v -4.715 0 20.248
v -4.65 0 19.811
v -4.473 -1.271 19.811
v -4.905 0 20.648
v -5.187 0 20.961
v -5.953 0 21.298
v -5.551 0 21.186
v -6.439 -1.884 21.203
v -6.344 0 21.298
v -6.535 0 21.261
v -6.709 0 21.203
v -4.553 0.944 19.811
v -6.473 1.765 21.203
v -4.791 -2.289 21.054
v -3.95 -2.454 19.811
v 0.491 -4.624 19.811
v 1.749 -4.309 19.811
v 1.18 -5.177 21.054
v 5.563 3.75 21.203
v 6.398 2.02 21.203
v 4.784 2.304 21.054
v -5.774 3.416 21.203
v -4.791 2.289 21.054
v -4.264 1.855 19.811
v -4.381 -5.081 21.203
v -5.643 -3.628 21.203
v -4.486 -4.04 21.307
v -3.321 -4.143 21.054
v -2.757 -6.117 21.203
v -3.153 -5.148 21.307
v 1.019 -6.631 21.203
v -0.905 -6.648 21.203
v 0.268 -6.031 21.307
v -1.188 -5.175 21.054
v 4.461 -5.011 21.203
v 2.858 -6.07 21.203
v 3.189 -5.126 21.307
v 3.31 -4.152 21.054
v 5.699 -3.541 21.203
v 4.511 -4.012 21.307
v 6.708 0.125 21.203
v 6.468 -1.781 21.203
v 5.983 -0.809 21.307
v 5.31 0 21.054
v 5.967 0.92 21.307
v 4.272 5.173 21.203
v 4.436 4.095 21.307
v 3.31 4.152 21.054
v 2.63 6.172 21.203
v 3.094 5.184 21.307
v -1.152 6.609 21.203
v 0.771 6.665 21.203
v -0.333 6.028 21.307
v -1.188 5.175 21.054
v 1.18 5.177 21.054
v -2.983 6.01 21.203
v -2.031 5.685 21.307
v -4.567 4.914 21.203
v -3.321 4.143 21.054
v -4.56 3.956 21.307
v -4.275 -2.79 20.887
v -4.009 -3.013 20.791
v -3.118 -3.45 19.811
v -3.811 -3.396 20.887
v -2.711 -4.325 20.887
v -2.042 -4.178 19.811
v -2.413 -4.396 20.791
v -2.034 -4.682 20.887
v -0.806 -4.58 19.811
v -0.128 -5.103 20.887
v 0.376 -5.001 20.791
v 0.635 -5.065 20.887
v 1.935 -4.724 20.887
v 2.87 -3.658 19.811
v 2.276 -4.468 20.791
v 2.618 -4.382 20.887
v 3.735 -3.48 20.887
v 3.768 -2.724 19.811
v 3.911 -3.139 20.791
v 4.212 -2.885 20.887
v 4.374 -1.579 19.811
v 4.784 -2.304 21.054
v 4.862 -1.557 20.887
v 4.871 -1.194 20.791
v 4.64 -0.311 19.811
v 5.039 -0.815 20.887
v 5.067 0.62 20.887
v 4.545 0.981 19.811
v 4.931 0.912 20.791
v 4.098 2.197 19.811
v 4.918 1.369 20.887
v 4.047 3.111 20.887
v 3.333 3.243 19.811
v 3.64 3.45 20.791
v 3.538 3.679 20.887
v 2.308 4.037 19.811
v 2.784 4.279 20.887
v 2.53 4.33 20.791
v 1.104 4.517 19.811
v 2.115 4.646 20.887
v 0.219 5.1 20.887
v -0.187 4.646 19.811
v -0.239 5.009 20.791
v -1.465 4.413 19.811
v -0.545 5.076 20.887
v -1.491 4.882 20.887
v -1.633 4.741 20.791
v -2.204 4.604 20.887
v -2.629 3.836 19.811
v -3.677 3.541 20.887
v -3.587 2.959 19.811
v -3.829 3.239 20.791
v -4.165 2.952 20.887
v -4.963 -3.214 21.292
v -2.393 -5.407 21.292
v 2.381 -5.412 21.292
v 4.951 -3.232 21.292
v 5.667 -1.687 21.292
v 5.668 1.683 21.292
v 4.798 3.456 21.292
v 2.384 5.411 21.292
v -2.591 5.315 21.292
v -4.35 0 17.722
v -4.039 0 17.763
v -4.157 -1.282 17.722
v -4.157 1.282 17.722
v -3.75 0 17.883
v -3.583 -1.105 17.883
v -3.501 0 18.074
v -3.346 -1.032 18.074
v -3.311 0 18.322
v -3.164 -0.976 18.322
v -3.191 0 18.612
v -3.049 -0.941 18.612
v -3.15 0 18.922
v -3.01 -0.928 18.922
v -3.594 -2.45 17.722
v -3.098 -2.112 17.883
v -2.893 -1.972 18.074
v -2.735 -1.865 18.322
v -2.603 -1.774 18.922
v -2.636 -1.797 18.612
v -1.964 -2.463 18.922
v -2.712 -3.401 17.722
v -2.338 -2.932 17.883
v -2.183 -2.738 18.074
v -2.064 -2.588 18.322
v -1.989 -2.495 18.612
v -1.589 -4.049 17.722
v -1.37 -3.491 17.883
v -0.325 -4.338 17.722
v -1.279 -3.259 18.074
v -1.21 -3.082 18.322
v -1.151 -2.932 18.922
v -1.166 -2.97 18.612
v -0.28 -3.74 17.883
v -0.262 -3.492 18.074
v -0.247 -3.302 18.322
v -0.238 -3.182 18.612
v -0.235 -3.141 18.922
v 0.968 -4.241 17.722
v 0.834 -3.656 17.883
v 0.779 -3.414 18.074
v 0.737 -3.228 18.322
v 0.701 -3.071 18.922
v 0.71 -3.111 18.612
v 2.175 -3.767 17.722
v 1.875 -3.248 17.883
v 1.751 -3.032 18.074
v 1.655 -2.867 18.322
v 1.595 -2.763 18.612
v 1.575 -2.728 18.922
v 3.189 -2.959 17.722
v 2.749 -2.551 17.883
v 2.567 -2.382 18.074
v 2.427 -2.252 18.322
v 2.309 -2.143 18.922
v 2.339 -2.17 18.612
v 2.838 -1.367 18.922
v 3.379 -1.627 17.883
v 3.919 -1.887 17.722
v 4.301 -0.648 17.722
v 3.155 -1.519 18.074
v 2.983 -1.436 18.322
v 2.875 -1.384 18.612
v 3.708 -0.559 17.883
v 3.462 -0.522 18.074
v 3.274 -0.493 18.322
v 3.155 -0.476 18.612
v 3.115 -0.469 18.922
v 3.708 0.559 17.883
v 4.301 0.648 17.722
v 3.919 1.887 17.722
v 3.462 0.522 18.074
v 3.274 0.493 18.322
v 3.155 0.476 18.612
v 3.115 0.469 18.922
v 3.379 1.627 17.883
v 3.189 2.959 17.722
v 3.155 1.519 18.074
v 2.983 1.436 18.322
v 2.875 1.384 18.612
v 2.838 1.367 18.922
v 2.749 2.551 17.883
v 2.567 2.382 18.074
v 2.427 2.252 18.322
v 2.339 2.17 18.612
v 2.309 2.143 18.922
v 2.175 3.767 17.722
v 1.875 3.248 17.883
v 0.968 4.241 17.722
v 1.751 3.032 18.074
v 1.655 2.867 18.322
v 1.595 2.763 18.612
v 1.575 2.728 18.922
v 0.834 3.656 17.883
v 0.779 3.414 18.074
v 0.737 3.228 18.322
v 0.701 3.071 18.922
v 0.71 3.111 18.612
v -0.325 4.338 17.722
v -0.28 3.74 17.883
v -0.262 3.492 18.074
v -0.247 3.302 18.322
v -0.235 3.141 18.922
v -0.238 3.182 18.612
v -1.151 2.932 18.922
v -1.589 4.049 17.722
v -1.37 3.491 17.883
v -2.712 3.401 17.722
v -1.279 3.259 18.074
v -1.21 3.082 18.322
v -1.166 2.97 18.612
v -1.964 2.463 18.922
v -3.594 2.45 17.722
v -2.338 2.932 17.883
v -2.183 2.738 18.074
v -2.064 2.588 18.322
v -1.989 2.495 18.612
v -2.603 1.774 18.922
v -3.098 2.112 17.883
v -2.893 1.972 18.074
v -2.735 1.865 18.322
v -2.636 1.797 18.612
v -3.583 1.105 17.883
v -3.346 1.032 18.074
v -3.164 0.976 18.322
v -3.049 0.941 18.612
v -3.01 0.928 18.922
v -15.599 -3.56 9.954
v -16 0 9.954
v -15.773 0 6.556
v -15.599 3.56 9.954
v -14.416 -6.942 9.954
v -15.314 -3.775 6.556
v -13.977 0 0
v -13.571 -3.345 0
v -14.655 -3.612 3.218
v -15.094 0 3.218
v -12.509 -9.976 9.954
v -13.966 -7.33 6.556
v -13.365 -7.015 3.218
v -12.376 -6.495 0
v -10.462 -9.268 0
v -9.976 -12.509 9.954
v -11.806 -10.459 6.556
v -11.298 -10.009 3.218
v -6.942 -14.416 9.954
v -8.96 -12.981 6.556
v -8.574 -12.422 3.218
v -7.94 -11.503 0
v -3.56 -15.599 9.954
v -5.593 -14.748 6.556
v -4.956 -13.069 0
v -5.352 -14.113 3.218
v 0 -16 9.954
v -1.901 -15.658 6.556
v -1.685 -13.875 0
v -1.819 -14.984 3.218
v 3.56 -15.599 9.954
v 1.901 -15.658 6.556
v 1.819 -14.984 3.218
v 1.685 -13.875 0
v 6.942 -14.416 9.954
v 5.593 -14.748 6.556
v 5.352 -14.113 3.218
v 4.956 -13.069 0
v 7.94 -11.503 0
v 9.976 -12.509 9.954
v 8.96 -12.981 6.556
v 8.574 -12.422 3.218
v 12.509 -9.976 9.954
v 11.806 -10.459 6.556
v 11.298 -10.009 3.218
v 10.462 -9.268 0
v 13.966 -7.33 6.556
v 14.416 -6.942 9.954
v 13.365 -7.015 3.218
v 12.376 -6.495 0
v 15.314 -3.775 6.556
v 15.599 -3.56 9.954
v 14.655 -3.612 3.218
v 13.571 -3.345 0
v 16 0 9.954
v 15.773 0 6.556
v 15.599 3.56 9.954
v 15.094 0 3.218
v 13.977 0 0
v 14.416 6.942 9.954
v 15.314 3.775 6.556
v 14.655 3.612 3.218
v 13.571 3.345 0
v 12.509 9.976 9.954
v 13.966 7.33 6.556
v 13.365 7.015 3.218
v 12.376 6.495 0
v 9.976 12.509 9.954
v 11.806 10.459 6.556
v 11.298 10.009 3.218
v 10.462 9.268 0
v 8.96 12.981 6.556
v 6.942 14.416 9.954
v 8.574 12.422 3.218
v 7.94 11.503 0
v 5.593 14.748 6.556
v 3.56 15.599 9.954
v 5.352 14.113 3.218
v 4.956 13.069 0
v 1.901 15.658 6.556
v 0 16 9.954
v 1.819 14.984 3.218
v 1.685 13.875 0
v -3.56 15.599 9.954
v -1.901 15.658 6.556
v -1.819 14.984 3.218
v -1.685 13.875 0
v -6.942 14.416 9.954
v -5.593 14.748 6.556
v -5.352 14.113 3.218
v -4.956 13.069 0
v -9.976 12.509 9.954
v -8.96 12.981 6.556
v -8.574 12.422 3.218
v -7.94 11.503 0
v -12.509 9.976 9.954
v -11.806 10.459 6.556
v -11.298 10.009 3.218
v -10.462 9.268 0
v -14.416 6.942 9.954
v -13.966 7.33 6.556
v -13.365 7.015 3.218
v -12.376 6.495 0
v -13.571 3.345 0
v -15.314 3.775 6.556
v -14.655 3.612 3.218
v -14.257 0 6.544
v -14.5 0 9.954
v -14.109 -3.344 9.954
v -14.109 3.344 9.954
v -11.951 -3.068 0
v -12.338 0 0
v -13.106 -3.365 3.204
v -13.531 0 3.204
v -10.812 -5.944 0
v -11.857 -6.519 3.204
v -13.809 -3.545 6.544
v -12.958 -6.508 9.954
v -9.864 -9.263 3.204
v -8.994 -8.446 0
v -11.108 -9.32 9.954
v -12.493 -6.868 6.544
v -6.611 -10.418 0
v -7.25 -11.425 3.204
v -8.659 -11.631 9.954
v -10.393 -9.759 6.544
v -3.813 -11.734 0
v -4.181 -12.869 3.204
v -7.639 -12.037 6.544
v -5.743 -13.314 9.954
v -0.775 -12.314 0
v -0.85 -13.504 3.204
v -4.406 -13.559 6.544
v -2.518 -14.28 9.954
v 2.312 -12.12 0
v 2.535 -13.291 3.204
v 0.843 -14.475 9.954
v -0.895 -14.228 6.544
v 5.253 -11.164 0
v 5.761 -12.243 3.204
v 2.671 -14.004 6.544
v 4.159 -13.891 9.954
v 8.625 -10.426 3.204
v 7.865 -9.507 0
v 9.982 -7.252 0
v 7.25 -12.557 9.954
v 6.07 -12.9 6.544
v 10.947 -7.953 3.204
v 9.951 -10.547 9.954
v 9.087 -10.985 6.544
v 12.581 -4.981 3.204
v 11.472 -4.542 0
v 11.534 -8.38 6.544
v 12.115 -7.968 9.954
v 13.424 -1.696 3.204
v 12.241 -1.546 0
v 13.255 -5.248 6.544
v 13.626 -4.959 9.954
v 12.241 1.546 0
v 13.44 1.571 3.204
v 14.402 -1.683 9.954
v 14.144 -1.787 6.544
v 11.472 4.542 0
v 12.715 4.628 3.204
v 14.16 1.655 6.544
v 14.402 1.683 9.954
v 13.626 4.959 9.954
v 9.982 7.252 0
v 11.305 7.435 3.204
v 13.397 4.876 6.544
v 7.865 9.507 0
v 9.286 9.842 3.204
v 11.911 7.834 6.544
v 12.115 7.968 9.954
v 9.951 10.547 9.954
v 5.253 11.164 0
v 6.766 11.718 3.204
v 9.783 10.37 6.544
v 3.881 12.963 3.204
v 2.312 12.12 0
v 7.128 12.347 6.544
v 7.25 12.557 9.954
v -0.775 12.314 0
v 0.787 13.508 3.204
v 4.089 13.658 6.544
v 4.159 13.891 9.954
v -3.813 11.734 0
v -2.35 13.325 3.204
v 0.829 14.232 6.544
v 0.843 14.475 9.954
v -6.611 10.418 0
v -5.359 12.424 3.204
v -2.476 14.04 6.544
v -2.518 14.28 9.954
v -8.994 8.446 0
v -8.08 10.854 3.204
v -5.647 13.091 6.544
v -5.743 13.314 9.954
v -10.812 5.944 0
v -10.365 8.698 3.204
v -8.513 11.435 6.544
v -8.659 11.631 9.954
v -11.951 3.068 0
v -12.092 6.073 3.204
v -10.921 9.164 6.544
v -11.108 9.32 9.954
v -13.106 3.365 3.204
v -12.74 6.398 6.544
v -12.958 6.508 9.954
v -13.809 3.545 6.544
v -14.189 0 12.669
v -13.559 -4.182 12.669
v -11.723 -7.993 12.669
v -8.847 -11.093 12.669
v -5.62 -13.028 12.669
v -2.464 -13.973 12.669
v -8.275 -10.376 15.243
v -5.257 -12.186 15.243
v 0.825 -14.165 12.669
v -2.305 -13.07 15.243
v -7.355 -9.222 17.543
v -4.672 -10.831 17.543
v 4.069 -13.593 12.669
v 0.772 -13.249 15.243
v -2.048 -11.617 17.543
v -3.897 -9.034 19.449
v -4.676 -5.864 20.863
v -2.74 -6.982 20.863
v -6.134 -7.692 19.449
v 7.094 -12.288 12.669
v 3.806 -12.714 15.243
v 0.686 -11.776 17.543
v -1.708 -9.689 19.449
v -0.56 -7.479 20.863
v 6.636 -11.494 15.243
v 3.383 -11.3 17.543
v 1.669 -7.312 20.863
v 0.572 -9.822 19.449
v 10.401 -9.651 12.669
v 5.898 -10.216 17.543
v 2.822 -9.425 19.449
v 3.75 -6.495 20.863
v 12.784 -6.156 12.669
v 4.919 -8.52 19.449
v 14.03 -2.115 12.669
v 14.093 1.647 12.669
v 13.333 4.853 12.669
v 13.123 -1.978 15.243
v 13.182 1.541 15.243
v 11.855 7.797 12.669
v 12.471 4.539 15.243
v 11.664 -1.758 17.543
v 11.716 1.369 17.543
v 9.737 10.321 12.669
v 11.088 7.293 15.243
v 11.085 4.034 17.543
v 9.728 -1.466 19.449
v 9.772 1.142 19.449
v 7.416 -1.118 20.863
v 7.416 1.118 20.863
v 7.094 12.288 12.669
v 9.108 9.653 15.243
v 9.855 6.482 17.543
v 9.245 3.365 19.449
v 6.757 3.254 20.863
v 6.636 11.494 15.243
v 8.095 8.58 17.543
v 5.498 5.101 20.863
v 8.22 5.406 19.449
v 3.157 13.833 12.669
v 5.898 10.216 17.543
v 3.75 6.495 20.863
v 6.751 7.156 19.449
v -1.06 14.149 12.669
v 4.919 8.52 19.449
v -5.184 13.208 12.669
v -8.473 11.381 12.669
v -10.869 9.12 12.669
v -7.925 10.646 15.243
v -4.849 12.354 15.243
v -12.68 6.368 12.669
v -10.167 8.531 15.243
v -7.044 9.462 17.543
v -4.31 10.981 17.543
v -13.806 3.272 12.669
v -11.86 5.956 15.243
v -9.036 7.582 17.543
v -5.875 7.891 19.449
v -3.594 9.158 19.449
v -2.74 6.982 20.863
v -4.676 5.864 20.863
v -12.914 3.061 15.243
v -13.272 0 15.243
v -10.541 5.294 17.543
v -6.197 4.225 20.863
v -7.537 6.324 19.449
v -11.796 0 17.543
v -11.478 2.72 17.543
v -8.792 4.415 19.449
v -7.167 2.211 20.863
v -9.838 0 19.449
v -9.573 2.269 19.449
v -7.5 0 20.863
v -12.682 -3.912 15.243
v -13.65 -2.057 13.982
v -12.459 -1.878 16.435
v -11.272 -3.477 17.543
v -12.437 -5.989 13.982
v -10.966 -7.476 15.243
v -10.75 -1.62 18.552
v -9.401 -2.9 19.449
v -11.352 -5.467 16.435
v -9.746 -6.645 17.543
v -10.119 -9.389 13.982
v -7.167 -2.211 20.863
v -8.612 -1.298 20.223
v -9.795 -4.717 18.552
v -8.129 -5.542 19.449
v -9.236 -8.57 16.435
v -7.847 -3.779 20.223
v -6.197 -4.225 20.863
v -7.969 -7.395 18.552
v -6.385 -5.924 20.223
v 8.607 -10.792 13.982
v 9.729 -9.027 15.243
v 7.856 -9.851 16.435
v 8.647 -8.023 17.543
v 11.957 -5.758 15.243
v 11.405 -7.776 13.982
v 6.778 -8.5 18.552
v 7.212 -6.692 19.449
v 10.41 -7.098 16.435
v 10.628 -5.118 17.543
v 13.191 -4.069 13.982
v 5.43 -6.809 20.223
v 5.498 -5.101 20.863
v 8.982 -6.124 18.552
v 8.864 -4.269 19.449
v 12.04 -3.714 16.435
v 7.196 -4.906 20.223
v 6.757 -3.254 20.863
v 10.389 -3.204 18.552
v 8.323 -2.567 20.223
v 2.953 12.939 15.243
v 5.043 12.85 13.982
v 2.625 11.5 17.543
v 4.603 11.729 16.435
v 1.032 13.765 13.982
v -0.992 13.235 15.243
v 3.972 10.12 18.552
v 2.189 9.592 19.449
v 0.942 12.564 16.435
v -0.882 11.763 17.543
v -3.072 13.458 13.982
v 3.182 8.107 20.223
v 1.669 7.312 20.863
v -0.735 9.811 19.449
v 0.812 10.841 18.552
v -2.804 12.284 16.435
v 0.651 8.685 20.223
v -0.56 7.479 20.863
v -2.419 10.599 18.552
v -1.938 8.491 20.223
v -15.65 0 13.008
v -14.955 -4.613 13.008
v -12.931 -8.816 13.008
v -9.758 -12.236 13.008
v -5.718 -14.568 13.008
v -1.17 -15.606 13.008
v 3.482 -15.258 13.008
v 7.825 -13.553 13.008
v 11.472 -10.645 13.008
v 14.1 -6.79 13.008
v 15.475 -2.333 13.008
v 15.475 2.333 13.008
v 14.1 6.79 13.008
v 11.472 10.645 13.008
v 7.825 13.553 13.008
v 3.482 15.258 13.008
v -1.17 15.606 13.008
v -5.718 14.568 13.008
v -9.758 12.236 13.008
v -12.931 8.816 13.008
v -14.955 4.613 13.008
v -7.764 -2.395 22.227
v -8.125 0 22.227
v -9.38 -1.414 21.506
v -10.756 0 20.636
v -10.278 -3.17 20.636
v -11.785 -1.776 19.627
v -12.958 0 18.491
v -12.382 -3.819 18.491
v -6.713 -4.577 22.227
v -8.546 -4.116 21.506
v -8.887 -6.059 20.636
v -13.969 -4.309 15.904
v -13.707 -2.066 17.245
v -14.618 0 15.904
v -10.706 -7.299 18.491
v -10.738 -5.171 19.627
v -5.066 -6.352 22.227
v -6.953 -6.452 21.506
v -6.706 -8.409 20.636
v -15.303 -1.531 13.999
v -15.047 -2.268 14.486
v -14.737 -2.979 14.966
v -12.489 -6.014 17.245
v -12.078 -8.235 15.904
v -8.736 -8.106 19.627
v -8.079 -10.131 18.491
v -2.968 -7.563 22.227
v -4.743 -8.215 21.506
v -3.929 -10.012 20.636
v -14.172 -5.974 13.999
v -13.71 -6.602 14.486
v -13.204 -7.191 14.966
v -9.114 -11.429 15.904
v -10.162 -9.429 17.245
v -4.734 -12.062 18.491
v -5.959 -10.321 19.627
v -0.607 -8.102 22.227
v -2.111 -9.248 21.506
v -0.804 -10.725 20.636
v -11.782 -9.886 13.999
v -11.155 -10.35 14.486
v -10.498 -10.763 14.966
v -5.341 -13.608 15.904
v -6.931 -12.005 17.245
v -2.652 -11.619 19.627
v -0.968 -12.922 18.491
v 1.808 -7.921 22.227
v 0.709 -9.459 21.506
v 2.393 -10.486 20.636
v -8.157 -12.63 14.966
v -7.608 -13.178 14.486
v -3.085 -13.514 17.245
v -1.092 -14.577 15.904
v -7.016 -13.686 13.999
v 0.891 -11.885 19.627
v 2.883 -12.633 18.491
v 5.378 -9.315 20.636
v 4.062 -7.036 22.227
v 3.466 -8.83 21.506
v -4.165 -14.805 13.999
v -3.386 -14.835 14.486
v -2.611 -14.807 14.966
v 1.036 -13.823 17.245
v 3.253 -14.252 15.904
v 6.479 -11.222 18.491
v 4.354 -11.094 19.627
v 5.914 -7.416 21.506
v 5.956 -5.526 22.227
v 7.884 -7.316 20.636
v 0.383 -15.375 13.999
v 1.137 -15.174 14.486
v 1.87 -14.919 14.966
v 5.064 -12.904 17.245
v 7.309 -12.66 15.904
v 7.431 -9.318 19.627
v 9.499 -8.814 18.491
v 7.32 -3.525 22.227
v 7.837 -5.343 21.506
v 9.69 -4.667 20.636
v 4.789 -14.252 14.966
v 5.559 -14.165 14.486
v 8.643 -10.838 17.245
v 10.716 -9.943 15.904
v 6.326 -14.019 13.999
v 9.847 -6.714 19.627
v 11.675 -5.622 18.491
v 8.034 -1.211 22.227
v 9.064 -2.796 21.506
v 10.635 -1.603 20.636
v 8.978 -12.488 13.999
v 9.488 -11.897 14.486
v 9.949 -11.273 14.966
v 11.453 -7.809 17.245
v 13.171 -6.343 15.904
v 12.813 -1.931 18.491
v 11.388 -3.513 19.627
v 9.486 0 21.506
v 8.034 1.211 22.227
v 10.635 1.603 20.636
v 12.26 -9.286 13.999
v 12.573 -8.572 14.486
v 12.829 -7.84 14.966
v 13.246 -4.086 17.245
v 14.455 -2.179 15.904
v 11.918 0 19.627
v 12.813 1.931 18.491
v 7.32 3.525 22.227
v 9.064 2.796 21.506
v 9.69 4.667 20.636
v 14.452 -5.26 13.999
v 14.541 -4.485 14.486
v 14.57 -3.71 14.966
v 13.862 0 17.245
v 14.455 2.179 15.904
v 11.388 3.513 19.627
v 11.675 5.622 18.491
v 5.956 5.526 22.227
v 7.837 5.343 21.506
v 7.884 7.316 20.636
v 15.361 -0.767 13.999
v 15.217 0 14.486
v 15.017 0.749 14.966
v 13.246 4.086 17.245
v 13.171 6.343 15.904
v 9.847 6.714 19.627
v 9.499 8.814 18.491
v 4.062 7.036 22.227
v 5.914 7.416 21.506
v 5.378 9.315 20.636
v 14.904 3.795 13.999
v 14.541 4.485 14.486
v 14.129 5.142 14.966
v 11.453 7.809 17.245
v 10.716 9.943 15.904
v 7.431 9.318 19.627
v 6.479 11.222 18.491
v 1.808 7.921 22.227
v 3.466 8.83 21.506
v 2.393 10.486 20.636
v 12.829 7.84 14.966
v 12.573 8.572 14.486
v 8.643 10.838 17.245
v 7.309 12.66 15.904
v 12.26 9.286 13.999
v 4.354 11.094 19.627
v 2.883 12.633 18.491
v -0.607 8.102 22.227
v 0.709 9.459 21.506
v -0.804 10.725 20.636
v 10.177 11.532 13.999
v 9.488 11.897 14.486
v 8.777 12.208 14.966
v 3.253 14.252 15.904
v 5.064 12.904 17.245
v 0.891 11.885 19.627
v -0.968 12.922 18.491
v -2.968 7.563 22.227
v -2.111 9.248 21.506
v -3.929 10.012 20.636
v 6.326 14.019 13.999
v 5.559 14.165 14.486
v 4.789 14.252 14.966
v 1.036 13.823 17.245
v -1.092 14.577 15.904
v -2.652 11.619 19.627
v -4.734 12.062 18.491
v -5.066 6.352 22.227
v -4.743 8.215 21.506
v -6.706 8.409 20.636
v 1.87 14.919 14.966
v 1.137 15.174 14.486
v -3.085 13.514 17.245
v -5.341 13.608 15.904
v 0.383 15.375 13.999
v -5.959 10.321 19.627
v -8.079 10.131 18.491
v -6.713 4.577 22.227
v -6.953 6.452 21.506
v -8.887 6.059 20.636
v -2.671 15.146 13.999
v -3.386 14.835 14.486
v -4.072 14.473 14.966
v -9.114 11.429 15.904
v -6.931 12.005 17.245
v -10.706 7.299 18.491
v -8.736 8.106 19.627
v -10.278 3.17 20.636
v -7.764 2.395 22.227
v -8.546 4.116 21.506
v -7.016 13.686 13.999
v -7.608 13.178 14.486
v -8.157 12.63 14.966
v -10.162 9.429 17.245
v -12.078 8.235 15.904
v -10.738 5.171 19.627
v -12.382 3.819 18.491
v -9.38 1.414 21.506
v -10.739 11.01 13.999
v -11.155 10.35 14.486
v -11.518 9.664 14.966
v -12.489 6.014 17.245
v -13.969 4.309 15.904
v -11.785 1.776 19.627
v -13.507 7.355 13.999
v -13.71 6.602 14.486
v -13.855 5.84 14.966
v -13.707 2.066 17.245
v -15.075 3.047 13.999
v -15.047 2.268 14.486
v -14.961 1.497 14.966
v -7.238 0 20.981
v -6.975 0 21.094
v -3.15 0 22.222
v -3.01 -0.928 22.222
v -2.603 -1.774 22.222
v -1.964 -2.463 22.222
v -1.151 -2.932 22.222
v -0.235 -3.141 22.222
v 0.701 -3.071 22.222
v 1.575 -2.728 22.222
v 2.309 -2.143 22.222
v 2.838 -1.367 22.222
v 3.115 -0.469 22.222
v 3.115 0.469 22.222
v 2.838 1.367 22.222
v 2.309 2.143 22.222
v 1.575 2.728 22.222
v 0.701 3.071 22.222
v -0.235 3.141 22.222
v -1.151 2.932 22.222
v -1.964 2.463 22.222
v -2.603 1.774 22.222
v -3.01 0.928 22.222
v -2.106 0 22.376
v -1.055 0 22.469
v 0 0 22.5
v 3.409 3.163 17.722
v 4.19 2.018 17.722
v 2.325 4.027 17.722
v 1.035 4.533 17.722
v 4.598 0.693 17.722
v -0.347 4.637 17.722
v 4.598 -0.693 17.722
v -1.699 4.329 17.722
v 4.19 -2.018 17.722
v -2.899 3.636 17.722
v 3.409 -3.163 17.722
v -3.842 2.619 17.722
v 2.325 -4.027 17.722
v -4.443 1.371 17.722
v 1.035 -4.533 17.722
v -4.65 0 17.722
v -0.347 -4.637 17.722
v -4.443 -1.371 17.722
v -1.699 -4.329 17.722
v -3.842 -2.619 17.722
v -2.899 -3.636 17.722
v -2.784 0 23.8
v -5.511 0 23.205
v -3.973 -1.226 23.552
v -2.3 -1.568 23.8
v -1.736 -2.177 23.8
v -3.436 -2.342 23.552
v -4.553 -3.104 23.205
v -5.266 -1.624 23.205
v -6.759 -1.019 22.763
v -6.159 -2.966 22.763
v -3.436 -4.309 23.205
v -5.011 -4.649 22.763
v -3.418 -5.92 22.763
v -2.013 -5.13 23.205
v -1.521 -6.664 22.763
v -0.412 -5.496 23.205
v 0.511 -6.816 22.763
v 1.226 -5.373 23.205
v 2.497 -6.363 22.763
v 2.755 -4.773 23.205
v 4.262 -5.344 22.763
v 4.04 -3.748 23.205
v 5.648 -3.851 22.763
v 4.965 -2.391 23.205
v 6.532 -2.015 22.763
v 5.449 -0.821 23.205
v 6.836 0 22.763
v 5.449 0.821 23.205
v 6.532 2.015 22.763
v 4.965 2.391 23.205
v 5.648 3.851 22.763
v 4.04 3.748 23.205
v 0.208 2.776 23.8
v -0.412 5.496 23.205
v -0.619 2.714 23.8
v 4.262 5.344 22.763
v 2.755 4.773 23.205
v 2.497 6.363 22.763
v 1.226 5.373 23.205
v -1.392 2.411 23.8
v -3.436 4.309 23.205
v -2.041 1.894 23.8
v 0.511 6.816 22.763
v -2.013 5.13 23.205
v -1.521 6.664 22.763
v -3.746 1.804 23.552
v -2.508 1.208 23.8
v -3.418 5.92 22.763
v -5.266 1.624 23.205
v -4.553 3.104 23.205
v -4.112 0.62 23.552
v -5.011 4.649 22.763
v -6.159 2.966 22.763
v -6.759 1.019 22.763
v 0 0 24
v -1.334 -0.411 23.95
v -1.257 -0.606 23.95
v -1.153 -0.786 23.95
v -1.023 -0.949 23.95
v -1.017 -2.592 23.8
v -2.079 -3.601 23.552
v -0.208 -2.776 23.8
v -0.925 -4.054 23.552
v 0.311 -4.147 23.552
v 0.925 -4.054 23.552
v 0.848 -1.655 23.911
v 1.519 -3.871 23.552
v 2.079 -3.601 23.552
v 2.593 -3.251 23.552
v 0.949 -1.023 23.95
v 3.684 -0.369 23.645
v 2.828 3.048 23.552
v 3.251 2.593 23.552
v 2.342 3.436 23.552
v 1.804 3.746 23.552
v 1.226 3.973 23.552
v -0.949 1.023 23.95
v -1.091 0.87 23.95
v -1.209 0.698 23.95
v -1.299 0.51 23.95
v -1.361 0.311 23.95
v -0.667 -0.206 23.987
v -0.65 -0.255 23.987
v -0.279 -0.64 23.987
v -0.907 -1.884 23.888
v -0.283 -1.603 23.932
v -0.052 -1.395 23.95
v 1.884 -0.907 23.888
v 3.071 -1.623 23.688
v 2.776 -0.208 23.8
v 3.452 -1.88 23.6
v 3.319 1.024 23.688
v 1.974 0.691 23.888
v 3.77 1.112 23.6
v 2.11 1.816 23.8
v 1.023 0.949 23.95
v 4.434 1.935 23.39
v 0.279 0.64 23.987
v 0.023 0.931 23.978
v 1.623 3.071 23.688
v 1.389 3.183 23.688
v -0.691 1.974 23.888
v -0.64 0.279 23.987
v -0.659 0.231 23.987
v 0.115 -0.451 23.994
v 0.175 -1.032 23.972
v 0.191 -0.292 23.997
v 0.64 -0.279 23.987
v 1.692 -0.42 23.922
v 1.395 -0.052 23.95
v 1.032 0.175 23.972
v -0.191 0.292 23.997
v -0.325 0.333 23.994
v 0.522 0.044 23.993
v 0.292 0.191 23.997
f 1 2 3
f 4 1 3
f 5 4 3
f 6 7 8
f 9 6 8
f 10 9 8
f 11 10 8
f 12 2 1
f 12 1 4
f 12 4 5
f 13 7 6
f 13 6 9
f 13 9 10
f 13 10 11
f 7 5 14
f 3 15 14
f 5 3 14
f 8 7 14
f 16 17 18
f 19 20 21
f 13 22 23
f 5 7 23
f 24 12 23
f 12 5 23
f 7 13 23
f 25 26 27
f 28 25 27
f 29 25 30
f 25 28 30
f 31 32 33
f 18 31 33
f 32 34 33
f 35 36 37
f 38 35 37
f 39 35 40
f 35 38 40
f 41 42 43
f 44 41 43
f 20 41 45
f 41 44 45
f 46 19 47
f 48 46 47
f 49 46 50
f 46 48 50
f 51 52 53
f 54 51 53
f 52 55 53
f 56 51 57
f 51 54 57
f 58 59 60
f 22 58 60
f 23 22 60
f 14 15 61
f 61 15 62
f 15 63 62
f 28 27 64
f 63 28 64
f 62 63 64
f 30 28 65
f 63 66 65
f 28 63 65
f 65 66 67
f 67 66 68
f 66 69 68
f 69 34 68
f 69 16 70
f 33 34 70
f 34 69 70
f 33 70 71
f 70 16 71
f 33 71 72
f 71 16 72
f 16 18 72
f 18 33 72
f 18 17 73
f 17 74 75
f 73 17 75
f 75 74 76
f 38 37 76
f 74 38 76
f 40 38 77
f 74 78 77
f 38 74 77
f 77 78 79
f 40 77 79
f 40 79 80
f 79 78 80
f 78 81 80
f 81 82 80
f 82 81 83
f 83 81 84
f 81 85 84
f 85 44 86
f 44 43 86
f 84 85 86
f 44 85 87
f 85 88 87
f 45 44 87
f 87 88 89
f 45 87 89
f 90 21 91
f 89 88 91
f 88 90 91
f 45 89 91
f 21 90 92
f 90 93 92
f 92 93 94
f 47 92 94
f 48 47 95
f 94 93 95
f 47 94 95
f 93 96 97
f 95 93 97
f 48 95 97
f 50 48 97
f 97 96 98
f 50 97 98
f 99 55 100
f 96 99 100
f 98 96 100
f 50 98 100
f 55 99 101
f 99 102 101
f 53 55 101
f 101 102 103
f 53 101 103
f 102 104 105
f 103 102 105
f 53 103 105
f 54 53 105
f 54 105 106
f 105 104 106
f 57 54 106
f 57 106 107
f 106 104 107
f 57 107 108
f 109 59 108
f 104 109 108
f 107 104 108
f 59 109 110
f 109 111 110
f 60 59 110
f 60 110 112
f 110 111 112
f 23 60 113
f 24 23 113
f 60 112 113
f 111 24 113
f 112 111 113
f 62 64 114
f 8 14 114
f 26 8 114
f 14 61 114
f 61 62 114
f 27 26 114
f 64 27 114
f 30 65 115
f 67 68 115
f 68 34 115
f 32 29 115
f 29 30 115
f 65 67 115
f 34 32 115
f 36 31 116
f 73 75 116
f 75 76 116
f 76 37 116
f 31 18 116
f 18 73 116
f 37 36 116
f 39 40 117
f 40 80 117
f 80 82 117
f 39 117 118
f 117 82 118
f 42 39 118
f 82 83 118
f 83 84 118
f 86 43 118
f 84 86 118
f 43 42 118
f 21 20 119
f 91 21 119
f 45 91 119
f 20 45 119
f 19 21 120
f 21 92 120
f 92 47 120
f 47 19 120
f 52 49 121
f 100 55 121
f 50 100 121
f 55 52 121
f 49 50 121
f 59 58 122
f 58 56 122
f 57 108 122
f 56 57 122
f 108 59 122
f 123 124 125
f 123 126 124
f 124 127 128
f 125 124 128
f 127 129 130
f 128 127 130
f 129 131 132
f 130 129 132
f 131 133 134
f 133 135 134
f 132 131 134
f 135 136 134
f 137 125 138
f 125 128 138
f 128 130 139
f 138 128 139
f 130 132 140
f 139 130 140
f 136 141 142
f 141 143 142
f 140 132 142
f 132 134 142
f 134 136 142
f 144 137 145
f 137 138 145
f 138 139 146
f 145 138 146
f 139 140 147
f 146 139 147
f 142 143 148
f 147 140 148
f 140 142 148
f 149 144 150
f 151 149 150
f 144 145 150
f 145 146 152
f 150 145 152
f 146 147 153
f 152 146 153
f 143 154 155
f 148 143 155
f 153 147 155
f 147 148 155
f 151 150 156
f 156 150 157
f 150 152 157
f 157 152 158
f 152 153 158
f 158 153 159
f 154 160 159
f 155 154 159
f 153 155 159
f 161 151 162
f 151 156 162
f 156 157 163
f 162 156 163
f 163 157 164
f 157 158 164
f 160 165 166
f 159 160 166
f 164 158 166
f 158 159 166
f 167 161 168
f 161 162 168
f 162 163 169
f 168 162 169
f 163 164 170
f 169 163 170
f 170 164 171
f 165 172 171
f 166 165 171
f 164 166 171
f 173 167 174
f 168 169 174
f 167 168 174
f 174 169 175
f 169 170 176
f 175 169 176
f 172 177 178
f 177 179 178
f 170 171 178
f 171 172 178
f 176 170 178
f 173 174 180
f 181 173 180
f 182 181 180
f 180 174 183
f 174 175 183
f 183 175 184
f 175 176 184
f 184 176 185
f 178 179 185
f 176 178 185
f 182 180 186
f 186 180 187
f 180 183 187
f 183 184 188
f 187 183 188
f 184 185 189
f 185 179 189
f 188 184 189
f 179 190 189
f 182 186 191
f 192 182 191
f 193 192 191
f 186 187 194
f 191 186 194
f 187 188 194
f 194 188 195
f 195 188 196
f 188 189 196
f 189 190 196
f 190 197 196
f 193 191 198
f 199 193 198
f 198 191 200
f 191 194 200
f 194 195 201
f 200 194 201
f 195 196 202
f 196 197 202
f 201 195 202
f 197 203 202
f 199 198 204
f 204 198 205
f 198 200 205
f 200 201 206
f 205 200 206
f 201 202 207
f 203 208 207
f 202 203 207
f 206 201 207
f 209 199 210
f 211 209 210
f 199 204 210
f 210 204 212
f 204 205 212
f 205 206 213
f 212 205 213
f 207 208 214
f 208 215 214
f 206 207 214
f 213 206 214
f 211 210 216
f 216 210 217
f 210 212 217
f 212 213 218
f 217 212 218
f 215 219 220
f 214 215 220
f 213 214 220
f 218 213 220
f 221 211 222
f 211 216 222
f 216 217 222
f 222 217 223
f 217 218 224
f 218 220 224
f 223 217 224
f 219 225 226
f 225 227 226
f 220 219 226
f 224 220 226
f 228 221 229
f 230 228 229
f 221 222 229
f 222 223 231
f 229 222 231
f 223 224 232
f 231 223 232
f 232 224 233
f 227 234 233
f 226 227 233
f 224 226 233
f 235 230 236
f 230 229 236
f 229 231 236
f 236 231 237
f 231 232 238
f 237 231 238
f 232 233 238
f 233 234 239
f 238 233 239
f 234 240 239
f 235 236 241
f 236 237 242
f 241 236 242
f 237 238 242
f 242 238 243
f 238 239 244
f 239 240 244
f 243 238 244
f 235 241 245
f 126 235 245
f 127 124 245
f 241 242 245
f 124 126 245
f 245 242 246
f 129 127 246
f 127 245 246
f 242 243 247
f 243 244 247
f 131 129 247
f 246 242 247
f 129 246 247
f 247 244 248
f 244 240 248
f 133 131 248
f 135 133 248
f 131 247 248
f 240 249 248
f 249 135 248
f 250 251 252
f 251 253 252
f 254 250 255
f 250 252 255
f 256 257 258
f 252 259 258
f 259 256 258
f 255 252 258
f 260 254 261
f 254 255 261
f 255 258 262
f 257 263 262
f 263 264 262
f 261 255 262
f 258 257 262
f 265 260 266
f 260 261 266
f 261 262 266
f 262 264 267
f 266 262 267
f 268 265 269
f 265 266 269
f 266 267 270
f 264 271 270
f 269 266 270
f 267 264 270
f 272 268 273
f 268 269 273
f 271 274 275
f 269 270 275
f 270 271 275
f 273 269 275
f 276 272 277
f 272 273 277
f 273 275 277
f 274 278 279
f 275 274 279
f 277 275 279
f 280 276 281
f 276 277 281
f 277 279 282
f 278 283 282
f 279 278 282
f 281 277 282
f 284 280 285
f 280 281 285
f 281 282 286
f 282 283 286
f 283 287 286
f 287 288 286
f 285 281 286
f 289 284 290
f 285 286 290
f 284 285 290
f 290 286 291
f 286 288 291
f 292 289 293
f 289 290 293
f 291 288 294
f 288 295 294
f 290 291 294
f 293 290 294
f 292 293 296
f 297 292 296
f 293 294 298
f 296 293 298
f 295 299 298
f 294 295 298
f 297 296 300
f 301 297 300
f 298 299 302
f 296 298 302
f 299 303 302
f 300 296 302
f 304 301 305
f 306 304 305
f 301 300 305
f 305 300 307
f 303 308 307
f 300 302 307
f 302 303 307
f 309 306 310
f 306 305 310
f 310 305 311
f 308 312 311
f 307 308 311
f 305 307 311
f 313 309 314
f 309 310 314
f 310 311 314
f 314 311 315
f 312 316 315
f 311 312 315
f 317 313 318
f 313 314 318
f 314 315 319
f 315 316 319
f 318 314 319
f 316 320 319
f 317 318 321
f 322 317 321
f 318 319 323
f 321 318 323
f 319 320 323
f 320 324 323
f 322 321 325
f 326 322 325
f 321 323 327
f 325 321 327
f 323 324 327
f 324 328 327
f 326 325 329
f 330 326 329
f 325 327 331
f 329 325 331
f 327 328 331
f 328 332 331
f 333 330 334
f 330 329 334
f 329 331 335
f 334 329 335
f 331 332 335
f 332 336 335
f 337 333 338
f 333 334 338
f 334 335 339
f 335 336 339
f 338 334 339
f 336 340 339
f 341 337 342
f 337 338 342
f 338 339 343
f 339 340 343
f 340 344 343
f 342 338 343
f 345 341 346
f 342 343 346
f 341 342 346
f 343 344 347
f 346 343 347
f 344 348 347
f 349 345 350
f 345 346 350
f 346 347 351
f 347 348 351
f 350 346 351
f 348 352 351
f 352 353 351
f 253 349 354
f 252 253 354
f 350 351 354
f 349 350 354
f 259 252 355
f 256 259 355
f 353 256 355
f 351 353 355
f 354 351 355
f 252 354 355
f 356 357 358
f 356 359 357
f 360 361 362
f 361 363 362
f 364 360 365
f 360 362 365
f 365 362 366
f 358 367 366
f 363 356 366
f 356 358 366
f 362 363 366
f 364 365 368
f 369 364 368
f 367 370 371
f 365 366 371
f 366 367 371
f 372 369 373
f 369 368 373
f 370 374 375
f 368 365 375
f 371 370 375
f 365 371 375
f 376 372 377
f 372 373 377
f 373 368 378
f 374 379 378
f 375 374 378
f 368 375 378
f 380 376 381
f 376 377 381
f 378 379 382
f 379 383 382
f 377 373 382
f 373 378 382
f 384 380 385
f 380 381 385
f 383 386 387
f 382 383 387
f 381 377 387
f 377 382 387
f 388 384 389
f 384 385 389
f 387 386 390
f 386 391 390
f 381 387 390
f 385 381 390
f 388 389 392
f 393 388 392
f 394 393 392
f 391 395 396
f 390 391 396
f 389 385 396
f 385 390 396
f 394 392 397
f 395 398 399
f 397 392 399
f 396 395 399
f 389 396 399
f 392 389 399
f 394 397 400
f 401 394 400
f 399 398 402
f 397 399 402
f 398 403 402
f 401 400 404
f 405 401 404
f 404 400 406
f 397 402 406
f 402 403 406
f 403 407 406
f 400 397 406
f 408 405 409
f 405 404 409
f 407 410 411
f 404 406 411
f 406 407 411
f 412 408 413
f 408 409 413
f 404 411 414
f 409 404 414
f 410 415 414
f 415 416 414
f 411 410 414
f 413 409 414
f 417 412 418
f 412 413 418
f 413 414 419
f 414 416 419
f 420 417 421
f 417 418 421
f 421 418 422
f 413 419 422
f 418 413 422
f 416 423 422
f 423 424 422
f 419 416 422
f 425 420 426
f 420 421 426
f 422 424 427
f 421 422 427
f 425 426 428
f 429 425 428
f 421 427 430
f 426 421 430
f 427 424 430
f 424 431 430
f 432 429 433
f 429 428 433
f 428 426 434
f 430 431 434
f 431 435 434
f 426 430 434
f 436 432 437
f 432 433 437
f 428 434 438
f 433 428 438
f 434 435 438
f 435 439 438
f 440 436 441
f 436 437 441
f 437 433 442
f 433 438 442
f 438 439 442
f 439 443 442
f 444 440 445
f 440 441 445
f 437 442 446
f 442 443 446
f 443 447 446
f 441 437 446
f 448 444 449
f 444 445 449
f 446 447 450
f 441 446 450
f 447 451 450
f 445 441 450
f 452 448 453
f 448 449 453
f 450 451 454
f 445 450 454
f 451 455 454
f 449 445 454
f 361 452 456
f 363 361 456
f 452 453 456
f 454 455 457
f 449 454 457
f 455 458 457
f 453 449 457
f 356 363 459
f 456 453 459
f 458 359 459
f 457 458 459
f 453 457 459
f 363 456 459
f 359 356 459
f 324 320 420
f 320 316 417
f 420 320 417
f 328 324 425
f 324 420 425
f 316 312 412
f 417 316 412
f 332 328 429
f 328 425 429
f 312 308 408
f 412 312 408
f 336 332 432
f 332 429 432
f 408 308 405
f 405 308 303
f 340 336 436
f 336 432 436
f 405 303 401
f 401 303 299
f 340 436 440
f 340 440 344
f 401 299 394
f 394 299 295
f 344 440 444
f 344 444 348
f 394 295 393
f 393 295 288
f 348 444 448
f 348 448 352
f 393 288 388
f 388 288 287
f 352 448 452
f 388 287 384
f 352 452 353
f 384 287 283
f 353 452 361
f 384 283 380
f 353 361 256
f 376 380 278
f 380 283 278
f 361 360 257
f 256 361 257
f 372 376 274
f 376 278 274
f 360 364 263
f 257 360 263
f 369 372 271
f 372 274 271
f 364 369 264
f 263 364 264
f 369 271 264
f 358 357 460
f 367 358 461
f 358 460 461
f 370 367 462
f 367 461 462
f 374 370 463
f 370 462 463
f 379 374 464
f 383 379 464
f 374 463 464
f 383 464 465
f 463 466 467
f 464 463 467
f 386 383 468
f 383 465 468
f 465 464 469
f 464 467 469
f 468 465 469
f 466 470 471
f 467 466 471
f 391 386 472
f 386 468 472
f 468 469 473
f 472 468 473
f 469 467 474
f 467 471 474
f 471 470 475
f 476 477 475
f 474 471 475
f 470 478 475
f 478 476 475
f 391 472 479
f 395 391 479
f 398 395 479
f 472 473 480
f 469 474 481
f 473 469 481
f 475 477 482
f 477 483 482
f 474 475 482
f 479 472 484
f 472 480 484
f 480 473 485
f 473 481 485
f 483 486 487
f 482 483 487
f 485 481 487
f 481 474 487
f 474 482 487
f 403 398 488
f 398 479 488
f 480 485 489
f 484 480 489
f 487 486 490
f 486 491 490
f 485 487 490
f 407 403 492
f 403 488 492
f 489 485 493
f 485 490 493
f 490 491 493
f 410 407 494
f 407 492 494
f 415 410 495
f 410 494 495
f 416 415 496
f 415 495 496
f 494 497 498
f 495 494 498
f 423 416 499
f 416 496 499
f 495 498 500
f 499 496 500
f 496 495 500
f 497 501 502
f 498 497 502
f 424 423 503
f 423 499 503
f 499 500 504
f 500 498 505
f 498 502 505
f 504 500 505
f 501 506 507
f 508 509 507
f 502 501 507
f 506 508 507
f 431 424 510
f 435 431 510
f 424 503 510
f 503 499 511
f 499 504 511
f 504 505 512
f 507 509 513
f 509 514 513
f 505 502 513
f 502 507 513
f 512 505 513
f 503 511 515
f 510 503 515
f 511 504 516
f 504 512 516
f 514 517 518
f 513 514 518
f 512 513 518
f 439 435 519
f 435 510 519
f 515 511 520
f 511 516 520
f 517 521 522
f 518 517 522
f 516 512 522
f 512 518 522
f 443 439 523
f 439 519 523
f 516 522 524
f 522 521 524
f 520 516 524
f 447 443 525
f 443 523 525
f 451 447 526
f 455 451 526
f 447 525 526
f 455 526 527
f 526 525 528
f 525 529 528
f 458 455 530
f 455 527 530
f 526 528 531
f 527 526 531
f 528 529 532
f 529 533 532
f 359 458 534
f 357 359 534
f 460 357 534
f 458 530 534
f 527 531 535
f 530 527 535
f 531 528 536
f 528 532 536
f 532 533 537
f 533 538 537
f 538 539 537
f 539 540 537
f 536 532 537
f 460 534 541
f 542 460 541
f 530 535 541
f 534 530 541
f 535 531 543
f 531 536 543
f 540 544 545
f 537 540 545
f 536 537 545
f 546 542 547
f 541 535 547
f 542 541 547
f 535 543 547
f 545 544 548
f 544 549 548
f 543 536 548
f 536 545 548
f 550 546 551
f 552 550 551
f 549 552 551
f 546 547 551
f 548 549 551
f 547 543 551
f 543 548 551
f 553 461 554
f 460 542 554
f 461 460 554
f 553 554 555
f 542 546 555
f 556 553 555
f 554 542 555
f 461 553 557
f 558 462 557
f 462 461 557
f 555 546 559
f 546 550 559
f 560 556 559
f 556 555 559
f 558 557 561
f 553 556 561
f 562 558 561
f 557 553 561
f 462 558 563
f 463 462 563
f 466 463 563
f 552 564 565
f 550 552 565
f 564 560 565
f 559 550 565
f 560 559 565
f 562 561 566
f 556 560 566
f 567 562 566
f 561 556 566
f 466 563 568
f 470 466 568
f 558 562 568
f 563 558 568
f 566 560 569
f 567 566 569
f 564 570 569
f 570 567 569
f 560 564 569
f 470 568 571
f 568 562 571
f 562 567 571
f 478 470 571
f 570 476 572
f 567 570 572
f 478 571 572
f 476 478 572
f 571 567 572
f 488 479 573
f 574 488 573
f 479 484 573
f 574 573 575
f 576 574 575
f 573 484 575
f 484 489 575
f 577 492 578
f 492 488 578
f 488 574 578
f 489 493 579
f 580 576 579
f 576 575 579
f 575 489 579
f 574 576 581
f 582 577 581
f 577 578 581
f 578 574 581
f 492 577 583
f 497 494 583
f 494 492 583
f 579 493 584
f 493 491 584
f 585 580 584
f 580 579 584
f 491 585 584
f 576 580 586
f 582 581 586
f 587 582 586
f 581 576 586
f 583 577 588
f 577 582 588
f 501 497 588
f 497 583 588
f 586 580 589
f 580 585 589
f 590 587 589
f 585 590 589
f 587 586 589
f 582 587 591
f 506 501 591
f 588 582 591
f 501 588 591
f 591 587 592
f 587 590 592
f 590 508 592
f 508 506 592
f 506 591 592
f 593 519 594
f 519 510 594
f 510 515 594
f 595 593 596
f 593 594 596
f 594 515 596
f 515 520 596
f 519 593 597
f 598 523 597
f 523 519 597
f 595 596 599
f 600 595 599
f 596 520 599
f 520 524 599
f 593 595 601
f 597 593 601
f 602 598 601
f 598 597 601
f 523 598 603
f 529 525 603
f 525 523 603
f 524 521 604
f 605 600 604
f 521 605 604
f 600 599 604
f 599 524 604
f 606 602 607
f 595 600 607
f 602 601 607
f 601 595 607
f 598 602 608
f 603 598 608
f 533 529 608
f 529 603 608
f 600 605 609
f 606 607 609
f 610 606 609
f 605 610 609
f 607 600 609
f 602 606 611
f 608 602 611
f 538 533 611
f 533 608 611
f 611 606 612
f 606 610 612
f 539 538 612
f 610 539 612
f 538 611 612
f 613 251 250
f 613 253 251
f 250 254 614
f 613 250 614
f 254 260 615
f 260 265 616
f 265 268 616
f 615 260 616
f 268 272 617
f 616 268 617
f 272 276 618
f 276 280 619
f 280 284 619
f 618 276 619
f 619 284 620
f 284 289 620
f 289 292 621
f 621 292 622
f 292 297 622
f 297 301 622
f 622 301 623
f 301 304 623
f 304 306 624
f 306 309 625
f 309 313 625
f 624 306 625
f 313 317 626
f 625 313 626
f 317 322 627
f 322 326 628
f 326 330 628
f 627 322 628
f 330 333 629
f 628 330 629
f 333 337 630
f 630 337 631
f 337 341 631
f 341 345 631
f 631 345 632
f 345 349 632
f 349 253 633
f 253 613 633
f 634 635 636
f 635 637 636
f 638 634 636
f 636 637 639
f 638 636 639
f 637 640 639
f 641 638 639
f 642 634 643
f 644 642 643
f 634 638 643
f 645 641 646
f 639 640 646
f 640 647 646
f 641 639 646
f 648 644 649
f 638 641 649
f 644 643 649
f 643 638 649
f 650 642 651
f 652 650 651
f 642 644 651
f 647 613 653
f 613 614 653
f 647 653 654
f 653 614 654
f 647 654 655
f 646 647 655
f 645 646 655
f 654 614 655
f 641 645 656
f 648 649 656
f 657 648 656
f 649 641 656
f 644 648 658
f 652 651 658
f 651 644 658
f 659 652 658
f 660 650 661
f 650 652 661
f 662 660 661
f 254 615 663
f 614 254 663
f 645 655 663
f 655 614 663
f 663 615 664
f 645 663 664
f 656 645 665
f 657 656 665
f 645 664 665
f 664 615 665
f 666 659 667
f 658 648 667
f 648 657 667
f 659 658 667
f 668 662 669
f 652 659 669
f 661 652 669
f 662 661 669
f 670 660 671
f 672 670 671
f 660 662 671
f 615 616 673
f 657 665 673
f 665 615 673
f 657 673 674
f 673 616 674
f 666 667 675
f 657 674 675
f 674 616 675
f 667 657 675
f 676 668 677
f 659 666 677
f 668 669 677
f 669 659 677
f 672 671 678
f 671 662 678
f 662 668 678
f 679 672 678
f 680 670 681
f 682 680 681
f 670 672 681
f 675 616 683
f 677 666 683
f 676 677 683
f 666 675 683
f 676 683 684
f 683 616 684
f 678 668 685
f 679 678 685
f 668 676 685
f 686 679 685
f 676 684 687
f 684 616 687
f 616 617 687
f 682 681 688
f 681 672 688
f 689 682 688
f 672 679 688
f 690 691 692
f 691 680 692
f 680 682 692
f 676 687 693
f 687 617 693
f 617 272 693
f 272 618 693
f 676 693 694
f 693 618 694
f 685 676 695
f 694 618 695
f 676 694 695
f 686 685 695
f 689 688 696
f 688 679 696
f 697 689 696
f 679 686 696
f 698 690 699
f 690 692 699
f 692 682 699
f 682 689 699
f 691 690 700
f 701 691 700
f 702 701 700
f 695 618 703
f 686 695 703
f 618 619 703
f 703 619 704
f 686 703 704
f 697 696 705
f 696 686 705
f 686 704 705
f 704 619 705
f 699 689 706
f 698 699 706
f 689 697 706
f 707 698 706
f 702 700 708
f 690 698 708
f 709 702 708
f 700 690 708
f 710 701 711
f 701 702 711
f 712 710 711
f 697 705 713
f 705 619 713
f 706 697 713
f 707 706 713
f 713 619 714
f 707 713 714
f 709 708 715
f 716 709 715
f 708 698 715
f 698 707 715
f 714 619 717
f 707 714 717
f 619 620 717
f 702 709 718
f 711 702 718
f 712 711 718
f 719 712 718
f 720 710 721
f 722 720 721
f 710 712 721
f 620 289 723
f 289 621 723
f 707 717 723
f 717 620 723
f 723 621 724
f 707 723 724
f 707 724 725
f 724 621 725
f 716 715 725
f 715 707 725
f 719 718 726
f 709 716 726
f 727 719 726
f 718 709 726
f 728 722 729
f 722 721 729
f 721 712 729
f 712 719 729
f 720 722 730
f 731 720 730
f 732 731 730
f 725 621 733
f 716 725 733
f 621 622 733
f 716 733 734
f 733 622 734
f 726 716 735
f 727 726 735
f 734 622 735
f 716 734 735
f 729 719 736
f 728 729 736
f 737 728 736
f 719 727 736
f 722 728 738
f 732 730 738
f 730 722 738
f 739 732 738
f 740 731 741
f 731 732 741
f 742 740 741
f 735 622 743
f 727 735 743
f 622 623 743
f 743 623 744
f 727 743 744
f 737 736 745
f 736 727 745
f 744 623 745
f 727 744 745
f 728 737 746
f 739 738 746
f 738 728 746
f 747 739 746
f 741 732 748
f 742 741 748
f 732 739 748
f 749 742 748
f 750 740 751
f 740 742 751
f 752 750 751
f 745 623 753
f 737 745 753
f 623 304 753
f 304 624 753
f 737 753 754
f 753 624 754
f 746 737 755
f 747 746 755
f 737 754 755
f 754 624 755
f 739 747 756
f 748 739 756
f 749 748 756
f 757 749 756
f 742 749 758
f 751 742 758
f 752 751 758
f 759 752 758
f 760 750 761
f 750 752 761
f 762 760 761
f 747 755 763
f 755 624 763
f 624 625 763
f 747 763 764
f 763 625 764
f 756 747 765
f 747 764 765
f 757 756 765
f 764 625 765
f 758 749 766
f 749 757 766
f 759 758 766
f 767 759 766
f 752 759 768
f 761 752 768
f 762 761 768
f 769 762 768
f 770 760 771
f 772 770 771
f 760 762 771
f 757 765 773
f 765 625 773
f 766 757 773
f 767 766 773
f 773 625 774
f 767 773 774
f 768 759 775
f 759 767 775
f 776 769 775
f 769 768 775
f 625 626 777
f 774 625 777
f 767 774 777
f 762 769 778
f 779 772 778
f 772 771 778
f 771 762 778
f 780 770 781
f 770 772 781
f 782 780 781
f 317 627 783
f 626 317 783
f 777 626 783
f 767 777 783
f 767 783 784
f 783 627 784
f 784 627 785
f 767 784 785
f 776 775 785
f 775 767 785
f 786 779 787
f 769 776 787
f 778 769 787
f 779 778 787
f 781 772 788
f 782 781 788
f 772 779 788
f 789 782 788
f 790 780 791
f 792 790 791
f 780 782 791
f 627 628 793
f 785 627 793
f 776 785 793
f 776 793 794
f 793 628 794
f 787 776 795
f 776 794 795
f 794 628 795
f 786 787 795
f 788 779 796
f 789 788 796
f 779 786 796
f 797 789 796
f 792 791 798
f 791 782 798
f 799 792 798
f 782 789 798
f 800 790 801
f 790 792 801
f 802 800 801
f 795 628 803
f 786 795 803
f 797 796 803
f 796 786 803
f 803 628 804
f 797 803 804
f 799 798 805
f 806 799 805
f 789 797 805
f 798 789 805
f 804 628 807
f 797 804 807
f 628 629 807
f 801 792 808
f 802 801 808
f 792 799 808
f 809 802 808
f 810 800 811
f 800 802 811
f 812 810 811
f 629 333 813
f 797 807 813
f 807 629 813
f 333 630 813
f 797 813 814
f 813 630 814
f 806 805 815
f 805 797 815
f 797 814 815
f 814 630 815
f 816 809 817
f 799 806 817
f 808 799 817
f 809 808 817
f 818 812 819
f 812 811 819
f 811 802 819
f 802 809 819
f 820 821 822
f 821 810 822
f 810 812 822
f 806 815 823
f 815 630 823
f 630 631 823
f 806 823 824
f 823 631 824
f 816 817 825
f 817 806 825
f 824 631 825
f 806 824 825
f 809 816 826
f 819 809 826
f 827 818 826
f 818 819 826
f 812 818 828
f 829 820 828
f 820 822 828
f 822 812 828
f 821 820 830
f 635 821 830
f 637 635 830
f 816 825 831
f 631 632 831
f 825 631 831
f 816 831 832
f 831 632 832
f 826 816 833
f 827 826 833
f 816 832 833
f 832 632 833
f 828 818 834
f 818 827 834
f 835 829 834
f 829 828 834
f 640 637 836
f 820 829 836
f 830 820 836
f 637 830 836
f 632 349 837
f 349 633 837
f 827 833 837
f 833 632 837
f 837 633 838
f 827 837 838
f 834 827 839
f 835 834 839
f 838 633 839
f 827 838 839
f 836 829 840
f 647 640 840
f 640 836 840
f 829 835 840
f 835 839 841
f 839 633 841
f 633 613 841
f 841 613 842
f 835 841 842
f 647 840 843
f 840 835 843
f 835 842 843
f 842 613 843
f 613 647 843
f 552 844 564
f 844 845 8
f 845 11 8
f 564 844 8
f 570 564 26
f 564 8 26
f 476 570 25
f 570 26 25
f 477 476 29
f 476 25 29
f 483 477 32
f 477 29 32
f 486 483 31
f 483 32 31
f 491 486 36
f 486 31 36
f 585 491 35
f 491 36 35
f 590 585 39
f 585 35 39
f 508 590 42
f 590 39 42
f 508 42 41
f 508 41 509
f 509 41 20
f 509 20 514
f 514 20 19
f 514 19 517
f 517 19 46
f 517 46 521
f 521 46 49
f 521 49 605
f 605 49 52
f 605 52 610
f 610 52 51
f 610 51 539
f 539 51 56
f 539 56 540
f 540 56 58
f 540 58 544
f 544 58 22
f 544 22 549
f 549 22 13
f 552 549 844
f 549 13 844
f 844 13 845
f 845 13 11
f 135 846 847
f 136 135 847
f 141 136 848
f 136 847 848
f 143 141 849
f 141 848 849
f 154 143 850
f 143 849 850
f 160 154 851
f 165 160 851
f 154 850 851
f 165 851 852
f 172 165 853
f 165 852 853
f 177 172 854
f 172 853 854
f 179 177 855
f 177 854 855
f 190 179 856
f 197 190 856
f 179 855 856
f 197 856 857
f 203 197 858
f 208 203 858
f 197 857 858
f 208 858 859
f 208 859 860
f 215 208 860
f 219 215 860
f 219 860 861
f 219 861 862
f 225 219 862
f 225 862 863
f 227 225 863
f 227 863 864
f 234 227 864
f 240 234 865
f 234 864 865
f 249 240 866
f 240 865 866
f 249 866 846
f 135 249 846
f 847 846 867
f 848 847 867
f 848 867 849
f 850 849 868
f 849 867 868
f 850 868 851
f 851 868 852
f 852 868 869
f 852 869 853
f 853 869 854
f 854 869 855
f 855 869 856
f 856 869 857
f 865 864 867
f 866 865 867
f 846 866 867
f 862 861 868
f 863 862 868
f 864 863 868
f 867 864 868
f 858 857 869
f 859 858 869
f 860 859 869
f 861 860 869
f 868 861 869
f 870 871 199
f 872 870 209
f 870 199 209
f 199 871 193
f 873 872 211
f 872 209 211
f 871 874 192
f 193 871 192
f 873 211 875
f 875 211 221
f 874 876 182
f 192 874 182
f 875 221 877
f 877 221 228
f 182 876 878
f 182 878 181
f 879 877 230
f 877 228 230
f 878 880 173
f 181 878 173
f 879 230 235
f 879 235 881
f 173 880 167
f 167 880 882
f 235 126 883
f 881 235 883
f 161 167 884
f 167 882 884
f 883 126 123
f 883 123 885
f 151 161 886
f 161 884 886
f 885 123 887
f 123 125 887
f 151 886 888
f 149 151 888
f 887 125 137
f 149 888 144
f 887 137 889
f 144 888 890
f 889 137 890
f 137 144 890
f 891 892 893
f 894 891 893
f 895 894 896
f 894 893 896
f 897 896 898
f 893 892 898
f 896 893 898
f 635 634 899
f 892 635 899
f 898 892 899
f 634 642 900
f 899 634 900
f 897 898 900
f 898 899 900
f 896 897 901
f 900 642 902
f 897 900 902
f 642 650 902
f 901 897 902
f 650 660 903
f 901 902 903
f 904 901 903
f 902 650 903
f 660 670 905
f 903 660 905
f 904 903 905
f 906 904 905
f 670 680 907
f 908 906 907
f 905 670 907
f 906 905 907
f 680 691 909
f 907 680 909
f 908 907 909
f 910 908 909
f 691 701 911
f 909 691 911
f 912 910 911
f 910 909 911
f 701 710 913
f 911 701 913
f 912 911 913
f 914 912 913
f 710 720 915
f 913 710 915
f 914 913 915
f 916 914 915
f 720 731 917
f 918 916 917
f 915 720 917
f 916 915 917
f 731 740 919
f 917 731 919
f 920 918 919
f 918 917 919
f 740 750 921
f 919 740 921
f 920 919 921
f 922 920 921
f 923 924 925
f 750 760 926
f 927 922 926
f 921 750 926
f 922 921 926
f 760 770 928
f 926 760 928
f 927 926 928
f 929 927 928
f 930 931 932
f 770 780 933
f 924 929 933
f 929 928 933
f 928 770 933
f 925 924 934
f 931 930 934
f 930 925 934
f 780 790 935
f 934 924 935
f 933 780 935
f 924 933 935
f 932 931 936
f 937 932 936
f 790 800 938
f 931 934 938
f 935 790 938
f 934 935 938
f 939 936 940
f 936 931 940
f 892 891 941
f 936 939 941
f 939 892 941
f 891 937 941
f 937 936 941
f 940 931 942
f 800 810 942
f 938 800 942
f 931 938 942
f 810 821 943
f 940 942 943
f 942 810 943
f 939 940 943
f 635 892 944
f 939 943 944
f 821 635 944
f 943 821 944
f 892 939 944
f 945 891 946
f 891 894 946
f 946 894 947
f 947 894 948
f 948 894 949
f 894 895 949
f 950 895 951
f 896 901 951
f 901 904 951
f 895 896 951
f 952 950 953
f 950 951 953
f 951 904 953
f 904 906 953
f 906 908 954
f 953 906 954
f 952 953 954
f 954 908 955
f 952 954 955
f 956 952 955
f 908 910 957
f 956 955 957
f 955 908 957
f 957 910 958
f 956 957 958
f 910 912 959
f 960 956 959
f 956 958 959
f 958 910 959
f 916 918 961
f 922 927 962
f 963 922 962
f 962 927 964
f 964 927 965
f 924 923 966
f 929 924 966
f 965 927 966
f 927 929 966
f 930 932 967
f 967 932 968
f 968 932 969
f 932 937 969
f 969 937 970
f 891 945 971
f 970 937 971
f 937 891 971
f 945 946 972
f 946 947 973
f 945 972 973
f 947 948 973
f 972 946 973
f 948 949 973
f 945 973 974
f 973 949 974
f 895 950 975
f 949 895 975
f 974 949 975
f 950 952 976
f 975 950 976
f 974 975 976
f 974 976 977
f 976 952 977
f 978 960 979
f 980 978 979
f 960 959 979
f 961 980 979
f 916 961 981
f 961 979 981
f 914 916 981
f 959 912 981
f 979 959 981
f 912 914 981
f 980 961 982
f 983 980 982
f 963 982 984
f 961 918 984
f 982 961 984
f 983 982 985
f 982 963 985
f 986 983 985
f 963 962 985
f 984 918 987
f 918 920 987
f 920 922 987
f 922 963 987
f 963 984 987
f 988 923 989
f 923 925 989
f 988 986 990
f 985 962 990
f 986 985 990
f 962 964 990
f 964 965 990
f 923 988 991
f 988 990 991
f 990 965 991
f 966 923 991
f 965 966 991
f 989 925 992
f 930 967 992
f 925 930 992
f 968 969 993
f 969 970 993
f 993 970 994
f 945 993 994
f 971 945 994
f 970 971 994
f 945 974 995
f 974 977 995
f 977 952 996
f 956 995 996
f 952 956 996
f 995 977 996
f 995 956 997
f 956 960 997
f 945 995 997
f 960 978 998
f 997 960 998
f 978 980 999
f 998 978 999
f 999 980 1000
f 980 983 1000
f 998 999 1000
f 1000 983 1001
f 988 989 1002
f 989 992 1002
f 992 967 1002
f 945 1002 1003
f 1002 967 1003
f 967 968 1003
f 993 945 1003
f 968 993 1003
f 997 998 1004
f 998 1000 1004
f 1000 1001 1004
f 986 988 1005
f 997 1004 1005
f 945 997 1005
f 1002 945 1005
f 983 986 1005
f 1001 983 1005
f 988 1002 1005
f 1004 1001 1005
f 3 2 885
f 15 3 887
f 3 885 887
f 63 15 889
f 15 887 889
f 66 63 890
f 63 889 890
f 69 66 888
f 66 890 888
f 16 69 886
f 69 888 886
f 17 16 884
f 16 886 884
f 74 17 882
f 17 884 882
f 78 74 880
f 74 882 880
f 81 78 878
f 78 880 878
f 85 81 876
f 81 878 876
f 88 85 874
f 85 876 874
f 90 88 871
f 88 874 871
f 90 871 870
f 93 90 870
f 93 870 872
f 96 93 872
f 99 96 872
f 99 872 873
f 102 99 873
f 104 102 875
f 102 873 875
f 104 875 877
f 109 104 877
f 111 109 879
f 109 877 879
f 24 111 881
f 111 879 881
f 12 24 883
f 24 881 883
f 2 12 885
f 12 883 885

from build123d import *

# Parameters (mm, degrees)
F2_R = 1.2
F3_R = 1.5


# Not quite as in the source:
# - ends of sketch curves that miss each other by under 0.0002 mm in the source are joined


with BuildPart() as f1:
    # F0 (on Front) → F1 (revolve)
    with BuildSketch(Plane.XZ):
        with BuildLine():
            ThreePointArc((-3.15, 22.2222318008), (-3.903557352, 22.0716316829), (-4.65, 21.8890051469))
            Line((-4.65, 21.8890051469), (-4.65, 17.7222318008))
            Line((-4.65, 17.7222318008), (-3.15, 17.7222318008))
            Line((-3.15, 17.7222318008), (-3.15, 22.2222318008))
        make_face()
        with BuildLine():
            ThreePointArc((-7.4999988015, 20.8630687213), (-6.0966182517, 21.4360929938), (-4.65, 21.8890051469))
            ThreePointArc((-4.65, 21.8890051469), (-3.903557352, 22.0716316829), (-3.15, 22.2222318008))
            ThreePointArc((-3.15, 22.2222318008), (-1.5811115688, 22.430423481), (0, 22.5))
            Line((0, 22.5), (0, 24))
            ThreePointArc((0, 24), (-4.1581350796, 23.5515072433), (-8.1249988681, 22.2266581445))
            ThreePointArc((-8.1249988681, 22.2266581445), (-13.8619427254, 17.245190158), (-16, 9.9543562404))
            ThreePointArc((-16, 9.9543562404), (-15.4890851758, 4.8754171303), (-13.9768139545, 0))
            Line((-13.9768139545, 0), (-12.3382868923, 0))
            ThreePointArc((-12.3382868923, 0), (-13.9533457904, 4.8611693699), (-14.4999996005, 9.9543562404))
            ThreePointArc((-14.4999996005, 9.9543562404), (-12.5995043015, 16.4350973087), (-7.4999988015, 20.8630687213))
        make_face()
    revolve(axis=Axis((0, 0, 23.25), (0, 0, 1)))

    # F2
    f2_edges = [f1.edges().sort_by_distance(p)[0] for p in [
        (3.15, 0, 17.722232),
    ]]
    fillet(f2_edges, radius=F2_R)

    # F3
    f3_edges = [f1.edges().sort_by_distance(p)[0] for p in [
        (4.65, 0, 21.889005),
    ]]
    fillet(f3_edges, radius=F3_R)


solid = f1.part
